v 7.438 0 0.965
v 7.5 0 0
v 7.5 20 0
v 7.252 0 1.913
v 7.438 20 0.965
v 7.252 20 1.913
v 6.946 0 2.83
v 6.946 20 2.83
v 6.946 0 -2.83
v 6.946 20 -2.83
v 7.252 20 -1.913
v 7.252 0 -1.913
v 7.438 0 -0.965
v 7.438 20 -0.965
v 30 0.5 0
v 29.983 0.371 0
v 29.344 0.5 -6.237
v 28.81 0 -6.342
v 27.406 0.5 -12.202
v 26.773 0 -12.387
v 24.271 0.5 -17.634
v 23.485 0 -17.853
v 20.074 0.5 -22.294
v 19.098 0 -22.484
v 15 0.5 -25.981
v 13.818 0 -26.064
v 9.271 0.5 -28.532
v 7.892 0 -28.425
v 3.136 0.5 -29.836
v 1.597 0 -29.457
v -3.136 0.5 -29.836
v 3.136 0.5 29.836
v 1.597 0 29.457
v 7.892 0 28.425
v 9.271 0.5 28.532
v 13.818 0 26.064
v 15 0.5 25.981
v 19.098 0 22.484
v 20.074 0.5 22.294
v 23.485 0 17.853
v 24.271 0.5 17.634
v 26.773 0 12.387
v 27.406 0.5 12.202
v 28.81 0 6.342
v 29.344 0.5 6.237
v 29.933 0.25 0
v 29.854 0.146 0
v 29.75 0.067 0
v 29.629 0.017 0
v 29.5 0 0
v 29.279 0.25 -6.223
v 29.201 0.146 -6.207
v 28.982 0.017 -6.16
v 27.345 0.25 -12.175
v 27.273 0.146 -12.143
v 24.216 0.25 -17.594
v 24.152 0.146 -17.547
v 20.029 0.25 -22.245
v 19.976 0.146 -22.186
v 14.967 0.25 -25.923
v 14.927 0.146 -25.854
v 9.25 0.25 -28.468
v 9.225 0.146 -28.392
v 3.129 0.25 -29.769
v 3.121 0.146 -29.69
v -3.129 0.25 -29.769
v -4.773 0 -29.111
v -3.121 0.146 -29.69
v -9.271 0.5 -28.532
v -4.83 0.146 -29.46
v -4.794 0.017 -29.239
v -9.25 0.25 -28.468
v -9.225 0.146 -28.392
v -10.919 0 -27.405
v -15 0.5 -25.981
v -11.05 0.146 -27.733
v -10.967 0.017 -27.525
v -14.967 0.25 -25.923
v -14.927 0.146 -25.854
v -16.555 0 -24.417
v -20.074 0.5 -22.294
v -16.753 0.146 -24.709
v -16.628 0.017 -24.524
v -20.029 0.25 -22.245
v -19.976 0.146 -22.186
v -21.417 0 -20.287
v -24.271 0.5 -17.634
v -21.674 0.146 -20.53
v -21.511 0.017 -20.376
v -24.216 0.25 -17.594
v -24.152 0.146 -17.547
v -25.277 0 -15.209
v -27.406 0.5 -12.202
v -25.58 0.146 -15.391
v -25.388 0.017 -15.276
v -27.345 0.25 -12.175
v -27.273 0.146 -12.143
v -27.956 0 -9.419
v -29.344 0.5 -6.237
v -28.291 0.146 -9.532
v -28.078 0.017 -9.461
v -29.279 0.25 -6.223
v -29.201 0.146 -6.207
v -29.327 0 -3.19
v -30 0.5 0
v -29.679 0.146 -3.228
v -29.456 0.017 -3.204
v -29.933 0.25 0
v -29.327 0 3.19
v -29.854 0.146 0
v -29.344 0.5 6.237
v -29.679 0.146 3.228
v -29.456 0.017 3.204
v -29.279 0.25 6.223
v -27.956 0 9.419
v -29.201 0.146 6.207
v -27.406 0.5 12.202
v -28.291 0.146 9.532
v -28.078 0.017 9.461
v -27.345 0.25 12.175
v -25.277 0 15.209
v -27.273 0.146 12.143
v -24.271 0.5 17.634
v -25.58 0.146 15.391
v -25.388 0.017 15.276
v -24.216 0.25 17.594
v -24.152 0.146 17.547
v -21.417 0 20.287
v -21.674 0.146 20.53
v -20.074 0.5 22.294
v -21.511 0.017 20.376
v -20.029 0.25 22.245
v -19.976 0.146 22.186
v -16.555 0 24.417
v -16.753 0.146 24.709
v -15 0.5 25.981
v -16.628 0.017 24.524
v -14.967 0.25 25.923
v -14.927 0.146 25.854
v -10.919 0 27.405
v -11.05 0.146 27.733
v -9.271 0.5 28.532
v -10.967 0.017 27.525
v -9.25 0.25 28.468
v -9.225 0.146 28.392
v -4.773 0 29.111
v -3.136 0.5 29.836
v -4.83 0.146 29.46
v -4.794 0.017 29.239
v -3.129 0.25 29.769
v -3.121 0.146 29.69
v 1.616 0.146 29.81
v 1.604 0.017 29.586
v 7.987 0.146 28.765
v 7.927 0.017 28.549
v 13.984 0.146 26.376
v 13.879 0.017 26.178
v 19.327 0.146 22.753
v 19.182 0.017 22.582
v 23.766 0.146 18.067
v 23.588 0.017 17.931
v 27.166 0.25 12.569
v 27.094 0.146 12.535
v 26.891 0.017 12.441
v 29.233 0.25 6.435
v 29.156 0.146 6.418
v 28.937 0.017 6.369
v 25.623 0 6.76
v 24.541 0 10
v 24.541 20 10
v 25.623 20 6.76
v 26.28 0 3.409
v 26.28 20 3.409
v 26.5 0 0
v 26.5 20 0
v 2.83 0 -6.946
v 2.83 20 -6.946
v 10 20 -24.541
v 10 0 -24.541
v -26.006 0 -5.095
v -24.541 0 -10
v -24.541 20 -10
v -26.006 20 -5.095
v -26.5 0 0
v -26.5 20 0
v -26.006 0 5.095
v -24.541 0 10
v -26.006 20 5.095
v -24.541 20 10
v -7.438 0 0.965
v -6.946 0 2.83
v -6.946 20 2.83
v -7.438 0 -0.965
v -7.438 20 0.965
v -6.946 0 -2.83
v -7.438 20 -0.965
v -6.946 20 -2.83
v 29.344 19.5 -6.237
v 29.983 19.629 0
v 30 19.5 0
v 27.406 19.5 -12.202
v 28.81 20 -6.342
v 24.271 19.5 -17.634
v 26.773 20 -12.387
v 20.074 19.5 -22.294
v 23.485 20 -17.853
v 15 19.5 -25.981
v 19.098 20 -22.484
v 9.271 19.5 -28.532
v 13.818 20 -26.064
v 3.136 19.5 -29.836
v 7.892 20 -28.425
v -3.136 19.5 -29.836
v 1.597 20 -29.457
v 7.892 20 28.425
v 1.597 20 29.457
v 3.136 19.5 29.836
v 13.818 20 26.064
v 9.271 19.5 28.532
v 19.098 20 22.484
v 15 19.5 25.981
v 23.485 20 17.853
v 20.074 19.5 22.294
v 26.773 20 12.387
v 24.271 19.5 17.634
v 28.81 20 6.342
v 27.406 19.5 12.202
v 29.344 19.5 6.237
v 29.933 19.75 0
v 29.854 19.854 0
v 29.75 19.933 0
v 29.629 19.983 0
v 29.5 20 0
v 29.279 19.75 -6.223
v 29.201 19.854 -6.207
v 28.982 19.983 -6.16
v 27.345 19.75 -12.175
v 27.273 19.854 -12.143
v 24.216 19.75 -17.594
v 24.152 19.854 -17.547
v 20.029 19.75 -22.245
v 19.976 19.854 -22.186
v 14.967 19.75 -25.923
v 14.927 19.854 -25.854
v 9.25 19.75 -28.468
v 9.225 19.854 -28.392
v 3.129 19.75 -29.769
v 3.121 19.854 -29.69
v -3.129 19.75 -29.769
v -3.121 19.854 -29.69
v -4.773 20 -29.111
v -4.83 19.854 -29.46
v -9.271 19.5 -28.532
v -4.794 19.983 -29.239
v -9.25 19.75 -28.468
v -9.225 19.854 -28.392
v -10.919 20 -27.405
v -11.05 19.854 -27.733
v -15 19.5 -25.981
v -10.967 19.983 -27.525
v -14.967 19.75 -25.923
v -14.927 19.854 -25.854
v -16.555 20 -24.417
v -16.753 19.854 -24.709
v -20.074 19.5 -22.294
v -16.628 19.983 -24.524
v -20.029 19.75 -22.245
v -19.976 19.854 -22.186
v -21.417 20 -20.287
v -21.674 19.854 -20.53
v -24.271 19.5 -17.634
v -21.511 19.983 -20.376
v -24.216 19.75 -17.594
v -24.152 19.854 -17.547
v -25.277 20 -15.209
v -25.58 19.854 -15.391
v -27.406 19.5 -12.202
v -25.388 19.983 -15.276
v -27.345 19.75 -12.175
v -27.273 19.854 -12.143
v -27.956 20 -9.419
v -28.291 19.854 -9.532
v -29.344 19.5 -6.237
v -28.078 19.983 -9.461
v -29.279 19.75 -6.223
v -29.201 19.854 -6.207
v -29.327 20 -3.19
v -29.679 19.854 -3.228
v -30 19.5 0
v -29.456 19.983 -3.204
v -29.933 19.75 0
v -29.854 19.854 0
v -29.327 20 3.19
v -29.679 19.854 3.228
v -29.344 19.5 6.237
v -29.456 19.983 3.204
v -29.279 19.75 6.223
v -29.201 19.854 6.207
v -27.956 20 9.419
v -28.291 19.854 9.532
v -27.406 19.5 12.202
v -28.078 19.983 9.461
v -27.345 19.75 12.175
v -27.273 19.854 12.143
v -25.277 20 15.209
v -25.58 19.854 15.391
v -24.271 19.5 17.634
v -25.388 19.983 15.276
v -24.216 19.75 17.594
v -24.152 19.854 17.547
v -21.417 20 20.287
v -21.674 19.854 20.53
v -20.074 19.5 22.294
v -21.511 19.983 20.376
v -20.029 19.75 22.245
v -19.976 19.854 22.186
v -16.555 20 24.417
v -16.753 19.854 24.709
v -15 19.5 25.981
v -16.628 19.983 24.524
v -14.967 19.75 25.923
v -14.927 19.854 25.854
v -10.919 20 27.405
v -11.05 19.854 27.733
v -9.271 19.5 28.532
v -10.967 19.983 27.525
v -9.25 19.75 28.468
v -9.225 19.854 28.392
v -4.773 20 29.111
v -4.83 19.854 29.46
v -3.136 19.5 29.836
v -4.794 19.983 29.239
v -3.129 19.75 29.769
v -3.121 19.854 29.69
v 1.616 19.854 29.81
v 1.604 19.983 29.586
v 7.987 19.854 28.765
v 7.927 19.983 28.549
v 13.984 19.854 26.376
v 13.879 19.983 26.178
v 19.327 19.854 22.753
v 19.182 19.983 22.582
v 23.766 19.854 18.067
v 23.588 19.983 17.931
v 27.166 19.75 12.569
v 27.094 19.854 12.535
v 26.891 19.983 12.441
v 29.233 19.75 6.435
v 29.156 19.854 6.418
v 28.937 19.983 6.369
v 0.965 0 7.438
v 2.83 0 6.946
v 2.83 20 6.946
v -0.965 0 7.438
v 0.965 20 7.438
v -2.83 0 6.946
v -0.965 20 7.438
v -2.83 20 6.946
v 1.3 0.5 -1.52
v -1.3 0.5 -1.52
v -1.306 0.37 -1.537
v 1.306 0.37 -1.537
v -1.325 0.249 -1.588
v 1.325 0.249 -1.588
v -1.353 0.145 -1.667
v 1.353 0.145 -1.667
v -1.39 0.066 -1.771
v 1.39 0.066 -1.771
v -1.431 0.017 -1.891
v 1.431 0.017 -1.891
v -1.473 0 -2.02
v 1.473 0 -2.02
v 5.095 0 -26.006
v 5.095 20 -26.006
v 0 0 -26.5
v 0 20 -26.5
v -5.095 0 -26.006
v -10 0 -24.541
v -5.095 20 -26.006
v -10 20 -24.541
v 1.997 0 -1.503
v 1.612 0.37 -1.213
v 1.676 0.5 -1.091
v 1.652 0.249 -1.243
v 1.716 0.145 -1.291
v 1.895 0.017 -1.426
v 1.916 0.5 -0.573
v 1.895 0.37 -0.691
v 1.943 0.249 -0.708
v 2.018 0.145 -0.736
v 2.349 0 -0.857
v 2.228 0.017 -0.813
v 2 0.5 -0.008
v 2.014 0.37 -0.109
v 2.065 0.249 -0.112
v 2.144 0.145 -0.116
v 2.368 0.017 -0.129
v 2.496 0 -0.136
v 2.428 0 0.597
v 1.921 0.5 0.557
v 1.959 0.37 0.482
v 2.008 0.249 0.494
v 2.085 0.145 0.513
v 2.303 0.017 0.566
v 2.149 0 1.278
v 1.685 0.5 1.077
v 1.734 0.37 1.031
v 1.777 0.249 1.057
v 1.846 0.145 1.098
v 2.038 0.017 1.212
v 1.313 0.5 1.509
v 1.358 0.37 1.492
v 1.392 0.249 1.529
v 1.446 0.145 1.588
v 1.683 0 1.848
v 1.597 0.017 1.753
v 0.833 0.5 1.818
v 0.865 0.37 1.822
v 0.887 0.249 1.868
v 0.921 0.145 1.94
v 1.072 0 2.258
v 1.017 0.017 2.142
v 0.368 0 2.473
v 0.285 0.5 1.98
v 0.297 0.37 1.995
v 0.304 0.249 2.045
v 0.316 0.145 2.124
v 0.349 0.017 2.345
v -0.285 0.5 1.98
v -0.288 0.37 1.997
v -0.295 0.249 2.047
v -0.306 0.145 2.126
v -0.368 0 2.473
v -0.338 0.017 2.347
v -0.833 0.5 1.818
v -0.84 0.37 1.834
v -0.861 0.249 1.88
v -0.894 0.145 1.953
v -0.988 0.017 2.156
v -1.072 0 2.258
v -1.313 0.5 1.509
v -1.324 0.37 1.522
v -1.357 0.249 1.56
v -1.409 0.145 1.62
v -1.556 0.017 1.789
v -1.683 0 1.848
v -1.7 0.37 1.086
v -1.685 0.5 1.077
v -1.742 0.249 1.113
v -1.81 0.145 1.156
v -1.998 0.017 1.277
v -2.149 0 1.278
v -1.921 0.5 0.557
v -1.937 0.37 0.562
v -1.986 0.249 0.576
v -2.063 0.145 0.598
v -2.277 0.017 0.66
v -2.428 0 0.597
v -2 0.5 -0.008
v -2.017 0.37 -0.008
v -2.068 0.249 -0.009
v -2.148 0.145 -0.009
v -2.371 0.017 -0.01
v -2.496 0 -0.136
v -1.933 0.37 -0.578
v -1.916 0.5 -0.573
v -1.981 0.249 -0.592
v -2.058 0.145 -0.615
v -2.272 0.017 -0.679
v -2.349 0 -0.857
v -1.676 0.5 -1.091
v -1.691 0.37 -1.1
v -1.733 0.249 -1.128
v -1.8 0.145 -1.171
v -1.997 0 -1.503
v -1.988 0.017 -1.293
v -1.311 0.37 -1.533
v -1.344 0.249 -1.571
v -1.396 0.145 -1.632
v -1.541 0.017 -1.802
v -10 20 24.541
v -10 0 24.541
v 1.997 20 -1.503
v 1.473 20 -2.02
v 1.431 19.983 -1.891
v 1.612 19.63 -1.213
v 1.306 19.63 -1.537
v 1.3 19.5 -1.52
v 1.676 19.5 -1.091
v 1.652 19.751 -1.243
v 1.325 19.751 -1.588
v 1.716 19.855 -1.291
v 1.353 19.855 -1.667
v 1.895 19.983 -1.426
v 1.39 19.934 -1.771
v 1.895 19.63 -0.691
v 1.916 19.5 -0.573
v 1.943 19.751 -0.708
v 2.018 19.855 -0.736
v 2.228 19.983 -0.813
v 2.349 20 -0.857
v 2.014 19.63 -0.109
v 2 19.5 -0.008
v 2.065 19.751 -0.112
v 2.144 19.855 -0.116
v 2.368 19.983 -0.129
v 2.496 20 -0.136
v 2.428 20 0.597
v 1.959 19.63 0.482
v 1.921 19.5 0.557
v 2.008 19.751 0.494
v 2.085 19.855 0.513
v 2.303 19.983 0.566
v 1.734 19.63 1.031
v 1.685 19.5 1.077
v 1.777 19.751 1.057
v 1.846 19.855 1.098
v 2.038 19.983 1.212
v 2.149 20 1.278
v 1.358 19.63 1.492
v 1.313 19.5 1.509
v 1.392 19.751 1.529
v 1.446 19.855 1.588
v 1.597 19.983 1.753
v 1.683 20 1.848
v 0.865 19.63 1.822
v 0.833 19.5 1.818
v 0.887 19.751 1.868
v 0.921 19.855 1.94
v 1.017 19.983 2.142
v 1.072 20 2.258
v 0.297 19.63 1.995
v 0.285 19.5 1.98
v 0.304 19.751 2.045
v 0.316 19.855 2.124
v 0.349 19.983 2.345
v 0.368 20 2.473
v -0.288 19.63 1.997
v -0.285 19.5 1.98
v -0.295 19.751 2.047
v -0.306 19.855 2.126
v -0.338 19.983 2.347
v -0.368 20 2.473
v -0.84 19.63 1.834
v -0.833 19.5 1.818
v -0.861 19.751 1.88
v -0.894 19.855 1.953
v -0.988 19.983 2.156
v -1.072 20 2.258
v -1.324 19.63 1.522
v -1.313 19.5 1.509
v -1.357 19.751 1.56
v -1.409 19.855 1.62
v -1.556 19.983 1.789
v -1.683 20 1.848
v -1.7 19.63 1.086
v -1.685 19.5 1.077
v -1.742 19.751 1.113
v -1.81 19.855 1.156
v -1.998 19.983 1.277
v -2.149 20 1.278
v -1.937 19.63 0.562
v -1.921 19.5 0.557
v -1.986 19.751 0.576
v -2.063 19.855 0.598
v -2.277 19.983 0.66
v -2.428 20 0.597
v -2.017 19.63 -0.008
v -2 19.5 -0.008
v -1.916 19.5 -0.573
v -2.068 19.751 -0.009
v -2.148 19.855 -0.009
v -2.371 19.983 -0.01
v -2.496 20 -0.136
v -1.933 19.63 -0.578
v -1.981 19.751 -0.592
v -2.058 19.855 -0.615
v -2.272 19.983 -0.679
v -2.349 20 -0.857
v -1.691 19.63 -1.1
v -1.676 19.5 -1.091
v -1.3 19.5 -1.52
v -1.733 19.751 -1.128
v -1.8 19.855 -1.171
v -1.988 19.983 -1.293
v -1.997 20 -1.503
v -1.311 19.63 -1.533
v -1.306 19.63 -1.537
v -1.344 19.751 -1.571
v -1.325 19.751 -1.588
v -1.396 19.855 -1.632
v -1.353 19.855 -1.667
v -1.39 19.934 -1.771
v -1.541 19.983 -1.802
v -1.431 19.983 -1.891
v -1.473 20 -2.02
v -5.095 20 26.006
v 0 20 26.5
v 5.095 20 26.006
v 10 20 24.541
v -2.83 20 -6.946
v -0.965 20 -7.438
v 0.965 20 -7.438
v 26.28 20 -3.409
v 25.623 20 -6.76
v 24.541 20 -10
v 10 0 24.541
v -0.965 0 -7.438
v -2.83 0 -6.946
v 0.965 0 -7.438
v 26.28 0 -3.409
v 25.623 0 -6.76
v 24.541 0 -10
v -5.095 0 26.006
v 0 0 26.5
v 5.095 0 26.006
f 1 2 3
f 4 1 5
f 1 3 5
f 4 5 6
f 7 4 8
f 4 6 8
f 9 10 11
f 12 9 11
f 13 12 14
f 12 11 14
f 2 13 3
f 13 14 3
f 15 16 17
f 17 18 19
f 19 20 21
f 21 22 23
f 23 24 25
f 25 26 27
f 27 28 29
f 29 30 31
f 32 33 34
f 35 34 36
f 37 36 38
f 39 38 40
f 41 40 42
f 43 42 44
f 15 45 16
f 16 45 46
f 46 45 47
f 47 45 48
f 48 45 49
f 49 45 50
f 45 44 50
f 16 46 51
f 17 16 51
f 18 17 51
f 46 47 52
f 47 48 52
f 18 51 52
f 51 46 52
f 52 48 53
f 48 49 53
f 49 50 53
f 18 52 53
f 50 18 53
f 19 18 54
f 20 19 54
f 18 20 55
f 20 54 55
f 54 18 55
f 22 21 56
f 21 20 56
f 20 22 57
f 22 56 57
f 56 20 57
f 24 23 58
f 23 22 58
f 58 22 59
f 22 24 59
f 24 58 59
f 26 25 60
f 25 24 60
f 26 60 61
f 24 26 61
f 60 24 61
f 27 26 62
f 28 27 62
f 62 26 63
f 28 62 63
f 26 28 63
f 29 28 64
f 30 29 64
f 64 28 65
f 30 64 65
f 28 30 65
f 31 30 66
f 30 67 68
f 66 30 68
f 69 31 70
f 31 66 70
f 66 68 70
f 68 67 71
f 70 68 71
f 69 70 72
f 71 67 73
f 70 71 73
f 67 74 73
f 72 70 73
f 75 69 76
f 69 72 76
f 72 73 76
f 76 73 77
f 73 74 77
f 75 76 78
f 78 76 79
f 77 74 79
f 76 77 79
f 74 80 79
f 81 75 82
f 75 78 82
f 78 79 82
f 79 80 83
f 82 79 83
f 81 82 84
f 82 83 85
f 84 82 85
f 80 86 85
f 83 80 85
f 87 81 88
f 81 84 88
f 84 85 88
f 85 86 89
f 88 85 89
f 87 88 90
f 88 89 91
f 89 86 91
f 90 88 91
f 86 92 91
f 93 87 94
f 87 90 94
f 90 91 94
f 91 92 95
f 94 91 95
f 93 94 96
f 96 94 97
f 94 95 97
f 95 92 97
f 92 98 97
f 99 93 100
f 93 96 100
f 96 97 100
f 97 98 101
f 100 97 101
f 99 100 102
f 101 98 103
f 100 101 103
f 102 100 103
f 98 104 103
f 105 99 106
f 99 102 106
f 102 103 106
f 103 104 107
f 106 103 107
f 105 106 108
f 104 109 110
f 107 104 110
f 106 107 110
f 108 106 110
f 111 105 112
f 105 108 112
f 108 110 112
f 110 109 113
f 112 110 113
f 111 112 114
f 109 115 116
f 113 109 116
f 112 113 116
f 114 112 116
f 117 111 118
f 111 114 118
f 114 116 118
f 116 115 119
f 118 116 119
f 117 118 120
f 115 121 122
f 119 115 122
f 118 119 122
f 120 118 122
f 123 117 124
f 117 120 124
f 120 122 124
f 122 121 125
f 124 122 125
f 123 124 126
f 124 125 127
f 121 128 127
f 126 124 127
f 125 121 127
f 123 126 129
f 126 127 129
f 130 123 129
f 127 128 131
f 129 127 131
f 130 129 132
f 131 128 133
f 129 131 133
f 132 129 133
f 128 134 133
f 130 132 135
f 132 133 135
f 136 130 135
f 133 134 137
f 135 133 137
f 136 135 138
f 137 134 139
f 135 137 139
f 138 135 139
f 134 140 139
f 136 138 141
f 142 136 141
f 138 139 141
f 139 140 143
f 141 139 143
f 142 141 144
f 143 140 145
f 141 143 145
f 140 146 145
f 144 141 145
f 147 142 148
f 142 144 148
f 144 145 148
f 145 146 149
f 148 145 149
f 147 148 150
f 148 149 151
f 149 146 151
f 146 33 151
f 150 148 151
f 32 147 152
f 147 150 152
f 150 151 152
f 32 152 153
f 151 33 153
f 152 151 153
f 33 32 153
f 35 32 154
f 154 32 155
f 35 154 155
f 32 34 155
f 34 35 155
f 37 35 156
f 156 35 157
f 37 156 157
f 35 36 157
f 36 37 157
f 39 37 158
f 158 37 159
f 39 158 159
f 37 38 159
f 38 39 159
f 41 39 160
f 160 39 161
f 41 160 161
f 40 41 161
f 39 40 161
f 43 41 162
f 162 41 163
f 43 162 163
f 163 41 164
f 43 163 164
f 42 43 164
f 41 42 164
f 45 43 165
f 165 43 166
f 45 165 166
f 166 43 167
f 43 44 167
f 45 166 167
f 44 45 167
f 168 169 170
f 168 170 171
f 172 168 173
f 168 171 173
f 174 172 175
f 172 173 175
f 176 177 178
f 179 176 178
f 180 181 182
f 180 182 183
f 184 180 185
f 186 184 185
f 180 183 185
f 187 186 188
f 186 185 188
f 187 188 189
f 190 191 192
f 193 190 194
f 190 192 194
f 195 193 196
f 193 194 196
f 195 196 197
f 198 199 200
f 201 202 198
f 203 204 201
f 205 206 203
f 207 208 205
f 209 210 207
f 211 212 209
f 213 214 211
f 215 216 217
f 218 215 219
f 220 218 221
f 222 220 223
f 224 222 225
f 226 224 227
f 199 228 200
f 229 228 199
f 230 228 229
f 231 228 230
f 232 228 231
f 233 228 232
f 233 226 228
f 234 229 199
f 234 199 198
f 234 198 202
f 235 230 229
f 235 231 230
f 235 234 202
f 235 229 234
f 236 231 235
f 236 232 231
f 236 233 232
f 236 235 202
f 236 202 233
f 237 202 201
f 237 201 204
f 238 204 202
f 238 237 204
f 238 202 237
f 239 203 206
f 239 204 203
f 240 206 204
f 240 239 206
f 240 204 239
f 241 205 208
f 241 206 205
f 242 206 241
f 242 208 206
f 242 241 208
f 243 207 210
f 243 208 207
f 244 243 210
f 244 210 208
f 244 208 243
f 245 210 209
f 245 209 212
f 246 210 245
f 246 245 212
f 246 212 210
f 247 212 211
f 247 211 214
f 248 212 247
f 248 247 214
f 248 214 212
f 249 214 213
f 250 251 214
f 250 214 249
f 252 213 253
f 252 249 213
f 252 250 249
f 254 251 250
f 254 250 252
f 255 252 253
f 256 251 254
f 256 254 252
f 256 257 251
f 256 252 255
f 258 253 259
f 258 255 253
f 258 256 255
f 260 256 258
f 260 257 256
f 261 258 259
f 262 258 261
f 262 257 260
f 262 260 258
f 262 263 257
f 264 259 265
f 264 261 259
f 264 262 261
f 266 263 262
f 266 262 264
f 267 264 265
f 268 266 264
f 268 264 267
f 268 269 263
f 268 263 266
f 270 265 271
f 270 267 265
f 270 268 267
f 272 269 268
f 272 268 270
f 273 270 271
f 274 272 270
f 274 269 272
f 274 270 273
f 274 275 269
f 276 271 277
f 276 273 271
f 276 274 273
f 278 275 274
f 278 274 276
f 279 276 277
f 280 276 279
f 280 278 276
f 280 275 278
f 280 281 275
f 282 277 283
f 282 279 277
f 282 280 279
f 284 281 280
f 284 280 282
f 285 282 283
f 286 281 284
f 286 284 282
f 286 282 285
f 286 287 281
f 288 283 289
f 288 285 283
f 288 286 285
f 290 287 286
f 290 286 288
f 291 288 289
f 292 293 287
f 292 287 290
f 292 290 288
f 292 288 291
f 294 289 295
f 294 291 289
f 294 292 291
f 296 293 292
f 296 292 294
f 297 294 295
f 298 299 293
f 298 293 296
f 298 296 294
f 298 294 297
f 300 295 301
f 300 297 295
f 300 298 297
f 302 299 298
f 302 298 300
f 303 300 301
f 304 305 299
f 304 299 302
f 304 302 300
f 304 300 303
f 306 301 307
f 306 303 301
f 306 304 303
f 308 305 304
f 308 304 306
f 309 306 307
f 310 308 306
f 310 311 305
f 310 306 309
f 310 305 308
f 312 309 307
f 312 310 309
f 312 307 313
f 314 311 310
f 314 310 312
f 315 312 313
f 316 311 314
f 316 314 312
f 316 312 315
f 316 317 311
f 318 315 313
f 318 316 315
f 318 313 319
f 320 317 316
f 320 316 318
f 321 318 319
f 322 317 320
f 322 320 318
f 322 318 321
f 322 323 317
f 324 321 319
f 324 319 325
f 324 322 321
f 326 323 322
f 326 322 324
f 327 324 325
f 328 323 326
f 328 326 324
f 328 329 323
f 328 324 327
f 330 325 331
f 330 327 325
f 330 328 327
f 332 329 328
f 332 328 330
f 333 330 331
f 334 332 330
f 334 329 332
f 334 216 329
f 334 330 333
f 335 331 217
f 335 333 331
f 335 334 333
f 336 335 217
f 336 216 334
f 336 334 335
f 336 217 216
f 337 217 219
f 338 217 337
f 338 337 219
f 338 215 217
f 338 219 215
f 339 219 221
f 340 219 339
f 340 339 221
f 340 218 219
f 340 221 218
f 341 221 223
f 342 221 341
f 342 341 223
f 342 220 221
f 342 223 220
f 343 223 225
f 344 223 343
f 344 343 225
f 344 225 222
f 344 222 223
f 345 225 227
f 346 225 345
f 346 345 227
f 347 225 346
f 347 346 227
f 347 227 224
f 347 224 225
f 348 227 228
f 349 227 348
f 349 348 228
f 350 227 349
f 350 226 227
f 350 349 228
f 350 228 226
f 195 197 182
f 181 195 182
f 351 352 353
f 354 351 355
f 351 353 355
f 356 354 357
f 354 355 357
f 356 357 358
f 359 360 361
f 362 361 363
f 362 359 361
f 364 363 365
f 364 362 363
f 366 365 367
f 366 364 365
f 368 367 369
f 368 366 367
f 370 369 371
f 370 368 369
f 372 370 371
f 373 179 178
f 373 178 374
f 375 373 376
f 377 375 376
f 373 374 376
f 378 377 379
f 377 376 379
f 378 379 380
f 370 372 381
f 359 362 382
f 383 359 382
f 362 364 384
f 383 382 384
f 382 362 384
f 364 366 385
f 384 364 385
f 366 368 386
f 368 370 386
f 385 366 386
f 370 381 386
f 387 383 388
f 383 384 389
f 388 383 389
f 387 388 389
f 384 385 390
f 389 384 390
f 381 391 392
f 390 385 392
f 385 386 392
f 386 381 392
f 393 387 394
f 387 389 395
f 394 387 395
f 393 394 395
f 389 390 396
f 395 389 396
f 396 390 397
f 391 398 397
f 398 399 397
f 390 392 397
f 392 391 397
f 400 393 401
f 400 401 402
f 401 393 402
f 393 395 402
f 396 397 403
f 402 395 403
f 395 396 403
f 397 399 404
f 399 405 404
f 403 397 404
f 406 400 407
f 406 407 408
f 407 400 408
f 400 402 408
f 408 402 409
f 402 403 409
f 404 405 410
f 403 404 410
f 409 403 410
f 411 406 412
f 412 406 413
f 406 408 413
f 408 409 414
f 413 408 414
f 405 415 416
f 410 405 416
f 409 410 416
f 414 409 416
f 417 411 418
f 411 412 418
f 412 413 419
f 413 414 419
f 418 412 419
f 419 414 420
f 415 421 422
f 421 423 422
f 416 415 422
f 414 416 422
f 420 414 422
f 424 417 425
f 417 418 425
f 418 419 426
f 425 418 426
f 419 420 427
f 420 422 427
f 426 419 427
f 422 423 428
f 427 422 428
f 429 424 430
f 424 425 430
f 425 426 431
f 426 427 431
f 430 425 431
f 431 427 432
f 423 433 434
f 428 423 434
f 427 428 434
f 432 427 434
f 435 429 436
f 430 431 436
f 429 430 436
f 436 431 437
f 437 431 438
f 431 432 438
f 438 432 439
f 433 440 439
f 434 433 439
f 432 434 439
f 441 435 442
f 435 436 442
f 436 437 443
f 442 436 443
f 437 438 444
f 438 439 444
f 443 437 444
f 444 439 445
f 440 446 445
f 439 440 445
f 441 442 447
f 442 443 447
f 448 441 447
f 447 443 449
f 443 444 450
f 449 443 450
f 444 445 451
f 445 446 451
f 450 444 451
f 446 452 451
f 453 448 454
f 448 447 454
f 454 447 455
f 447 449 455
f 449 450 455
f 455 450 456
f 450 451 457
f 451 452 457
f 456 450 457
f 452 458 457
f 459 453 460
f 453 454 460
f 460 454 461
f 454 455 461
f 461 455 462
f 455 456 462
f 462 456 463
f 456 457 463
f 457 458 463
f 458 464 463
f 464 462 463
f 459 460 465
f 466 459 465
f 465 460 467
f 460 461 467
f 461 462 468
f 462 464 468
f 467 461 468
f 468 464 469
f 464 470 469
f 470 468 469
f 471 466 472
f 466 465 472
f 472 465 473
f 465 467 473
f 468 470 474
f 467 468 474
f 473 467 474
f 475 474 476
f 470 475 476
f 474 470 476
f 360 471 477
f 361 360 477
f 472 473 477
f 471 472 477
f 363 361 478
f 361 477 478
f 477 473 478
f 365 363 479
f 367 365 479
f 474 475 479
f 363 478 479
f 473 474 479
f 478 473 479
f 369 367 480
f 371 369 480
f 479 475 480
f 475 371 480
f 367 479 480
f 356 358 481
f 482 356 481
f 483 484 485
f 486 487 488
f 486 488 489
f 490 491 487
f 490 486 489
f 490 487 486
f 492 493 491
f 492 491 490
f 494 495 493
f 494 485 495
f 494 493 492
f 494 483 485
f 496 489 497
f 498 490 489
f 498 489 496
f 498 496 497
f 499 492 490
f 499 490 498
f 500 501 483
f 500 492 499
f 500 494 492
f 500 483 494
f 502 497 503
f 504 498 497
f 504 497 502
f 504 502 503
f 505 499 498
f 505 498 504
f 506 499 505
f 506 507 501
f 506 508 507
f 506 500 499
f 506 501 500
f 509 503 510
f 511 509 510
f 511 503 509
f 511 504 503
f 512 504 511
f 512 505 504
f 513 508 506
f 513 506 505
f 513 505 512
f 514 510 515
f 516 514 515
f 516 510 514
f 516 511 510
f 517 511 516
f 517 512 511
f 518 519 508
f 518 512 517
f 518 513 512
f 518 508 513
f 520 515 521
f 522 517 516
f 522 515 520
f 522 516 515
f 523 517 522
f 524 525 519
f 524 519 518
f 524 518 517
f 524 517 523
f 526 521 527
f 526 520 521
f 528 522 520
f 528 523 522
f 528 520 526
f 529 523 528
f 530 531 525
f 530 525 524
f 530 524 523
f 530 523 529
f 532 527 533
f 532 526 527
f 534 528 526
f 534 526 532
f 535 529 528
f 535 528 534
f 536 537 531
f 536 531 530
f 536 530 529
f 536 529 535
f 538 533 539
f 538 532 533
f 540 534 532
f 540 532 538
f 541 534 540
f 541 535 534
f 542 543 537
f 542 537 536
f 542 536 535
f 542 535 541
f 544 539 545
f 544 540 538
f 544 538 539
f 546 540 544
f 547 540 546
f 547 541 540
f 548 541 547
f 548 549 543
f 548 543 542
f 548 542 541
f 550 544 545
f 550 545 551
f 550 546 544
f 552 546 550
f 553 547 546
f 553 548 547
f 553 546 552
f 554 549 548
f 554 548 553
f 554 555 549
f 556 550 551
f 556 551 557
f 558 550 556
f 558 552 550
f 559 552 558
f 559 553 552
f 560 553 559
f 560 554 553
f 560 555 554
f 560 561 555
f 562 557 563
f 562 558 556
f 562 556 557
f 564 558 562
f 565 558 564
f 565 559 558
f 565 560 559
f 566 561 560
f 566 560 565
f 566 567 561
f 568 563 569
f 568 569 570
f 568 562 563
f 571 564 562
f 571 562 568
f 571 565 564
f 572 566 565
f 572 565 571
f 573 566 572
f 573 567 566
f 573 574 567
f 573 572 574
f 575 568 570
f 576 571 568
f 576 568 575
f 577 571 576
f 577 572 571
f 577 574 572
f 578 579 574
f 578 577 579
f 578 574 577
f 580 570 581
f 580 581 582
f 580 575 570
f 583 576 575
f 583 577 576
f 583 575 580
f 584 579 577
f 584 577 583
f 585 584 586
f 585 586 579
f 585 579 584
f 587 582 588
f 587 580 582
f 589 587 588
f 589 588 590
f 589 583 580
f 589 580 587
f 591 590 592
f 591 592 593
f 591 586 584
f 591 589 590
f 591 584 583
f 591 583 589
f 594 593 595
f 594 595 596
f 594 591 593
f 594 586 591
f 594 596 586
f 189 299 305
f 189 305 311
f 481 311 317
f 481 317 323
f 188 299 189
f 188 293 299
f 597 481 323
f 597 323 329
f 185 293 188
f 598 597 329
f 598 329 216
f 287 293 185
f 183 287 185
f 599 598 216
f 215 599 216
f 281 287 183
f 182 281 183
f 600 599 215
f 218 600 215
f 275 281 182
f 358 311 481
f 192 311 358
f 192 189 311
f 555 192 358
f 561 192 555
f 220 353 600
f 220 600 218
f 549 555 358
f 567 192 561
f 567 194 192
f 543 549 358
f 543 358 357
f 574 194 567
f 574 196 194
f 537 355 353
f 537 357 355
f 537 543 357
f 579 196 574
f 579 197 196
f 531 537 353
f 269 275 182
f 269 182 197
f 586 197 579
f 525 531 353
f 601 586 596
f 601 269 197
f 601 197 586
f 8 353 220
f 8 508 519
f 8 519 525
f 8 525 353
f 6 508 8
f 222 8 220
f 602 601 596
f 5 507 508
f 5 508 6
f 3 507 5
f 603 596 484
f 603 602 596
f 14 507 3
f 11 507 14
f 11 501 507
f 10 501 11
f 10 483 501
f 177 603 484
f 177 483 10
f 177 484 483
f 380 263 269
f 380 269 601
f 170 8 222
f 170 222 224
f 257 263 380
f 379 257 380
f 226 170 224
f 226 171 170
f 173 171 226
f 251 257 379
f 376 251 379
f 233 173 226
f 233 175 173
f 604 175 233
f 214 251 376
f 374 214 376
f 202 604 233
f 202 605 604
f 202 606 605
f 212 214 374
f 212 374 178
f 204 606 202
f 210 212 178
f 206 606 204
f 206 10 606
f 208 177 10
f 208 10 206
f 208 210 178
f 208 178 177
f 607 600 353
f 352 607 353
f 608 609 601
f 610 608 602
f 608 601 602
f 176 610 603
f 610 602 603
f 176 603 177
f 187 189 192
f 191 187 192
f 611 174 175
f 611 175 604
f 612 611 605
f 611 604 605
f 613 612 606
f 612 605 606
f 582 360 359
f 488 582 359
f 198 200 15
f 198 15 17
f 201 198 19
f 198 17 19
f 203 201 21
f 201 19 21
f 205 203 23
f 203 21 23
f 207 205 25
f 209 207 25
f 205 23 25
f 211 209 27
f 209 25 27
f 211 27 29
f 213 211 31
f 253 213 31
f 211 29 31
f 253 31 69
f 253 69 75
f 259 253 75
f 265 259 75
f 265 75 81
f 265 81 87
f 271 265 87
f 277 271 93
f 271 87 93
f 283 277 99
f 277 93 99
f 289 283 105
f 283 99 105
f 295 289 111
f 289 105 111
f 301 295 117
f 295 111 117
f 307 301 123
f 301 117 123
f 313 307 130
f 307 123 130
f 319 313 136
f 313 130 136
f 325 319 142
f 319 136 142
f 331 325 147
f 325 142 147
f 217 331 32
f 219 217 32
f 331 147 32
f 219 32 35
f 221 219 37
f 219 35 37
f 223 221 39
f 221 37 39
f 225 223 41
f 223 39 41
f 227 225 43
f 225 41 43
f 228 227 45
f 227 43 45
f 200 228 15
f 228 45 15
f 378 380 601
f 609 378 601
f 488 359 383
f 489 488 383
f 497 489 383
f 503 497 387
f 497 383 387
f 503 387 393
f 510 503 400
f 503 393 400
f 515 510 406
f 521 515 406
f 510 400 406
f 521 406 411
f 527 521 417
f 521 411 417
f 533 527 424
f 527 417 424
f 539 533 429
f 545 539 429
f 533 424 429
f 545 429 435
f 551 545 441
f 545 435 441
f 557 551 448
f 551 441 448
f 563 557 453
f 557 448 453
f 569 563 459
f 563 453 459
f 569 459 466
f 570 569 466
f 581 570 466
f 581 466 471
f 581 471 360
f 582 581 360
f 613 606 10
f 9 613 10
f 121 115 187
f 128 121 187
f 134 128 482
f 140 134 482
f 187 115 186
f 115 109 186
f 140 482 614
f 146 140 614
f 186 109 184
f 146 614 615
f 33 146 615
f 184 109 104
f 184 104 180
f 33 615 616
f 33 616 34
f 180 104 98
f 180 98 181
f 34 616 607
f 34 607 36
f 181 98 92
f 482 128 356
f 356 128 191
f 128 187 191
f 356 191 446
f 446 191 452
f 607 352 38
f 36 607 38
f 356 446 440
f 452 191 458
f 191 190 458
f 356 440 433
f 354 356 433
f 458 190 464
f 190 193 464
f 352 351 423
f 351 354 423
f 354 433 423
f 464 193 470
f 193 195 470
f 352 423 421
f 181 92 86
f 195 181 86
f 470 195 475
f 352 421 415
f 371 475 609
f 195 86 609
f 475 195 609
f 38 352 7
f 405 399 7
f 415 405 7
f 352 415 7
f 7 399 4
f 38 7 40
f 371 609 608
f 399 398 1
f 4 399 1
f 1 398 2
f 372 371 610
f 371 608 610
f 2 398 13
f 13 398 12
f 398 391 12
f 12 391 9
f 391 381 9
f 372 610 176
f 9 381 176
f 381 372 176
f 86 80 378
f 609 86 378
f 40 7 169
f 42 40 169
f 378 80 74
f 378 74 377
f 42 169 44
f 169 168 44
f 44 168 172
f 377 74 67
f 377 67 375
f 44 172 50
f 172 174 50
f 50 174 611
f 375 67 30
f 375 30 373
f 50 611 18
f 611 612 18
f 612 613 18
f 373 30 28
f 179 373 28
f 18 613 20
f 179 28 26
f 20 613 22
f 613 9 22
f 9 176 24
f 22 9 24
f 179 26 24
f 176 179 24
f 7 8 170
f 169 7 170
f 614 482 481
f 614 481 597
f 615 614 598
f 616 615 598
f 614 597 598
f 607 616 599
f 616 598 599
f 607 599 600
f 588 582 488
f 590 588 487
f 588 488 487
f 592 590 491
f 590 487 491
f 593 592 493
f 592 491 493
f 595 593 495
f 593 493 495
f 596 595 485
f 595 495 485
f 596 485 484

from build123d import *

# Parameters (mm, degrees)
SKETCH1_R           = 30
BOSS_EXTRUDE1_DEPTH = 20
FILLET1_R           = 0.5
CUT_EXTRUDE1_DEPTH  = 20


with BuildPart() as part:
    # Sketch1 → Boss-Extrude1 (new body)
    with BuildSketch(Plane(origin=(0, 0, 0), x_dir=(1, 0, 0), z_dir=(0, 1, 0))):
        Circle(SKETCH1_R)
        with BuildLine():
            Line((-1.3, 1.519868415), (1.3, 1.519868415))
            ThreePointArc((1.3, 1.519868415), (0, -2), (-1.3, 1.519868415))
        make_face(mode=Mode.SUBTRACT)
    extrude(amount=BOSS_EXTRUDE1_DEPTH)

    # Fillet1
    fillet1_edges = [part.edges().sort_by_distance(p)[0] for p in [
        (0, 20, -1.519868415),
        (-30, 20, 0),
        (-30, 0, 0),
        (0, 0, -1.519868415),
        (0, 0, 2),
        (0, 20, 2),
    ]]
    fillet(fillet1_edges, radius=FILLET1_R)

    # Sketch3 → Cut-Extrude1 (cut)
    with BuildSketch(Plane(origin=(0, 20, 0), x_dir=(1, 0, 0), z_dir=(0, 1, 0))):
        with BuildLine():
            ThreePointArc((10, 24.540782384), (0, 26.5), (-10, 24.540782384))
            Line((-10, 24.540782384), (-2.830188679, 6.945504448))
            ThreePointArc((-2.830188679, 6.945504448), (0, 7.5), (2.830188679, 6.945504448))
            Line((2.830188679, 6.945504448), (10, 24.540782384))
        make_face()
        with BuildLine():
            Line((-6.945504448, 2.830188679), (-24.540782384, 10))
            ThreePointArc((-24.540782384, 10), (-26.5, 0), (-24.540782384, -10))
            Line((-24.540782384, -10), (-6.945504448, -2.830188679))
            ThreePointArc((-6.945504448, -2.830188679), (-7.5, 0), (-6.945504448, 2.830188679))
        make_face()
        with BuildLine():
            ThreePointArc((26.5, 0), (26.005583373, 5.095059707), (24.540782384, 10))
            Line((24.540782384, 10), (6.945504448, 2.830188679))
            ThreePointArc((6.945504448, 2.830188679), (7.360070766, 1.44199803), (7.5, 0))
            ThreePointArc((7.5, 0), (7.360070766, -1.44199803), (6.945504448, -2.830188679))
            Line((6.945504448, -2.830188679), (24.540782384, -10))
            ThreePointArc((24.540782384, -10), (26.005583373, -5.095059707), (26.5, 0))
        make_face()
        with BuildLine():
            Line((-2.830188679, -6.945504448), (-10, -24.540782384))
            ThreePointArc((-10, -24.540782384), (0, -26.5), (10, -24.540782384))
            Line((10, -24.540782384), (2.830188679, -6.945504448))
            ThreePointArc((2.830188679, -6.945504448), (0, -7.5), (-2.830188679, -6.945504448))
        make_face()
    extrude(amount=-CUT_EXTRUDE1_DEPTH, mode=Mode.SUBTRACT)


solid = part.part
